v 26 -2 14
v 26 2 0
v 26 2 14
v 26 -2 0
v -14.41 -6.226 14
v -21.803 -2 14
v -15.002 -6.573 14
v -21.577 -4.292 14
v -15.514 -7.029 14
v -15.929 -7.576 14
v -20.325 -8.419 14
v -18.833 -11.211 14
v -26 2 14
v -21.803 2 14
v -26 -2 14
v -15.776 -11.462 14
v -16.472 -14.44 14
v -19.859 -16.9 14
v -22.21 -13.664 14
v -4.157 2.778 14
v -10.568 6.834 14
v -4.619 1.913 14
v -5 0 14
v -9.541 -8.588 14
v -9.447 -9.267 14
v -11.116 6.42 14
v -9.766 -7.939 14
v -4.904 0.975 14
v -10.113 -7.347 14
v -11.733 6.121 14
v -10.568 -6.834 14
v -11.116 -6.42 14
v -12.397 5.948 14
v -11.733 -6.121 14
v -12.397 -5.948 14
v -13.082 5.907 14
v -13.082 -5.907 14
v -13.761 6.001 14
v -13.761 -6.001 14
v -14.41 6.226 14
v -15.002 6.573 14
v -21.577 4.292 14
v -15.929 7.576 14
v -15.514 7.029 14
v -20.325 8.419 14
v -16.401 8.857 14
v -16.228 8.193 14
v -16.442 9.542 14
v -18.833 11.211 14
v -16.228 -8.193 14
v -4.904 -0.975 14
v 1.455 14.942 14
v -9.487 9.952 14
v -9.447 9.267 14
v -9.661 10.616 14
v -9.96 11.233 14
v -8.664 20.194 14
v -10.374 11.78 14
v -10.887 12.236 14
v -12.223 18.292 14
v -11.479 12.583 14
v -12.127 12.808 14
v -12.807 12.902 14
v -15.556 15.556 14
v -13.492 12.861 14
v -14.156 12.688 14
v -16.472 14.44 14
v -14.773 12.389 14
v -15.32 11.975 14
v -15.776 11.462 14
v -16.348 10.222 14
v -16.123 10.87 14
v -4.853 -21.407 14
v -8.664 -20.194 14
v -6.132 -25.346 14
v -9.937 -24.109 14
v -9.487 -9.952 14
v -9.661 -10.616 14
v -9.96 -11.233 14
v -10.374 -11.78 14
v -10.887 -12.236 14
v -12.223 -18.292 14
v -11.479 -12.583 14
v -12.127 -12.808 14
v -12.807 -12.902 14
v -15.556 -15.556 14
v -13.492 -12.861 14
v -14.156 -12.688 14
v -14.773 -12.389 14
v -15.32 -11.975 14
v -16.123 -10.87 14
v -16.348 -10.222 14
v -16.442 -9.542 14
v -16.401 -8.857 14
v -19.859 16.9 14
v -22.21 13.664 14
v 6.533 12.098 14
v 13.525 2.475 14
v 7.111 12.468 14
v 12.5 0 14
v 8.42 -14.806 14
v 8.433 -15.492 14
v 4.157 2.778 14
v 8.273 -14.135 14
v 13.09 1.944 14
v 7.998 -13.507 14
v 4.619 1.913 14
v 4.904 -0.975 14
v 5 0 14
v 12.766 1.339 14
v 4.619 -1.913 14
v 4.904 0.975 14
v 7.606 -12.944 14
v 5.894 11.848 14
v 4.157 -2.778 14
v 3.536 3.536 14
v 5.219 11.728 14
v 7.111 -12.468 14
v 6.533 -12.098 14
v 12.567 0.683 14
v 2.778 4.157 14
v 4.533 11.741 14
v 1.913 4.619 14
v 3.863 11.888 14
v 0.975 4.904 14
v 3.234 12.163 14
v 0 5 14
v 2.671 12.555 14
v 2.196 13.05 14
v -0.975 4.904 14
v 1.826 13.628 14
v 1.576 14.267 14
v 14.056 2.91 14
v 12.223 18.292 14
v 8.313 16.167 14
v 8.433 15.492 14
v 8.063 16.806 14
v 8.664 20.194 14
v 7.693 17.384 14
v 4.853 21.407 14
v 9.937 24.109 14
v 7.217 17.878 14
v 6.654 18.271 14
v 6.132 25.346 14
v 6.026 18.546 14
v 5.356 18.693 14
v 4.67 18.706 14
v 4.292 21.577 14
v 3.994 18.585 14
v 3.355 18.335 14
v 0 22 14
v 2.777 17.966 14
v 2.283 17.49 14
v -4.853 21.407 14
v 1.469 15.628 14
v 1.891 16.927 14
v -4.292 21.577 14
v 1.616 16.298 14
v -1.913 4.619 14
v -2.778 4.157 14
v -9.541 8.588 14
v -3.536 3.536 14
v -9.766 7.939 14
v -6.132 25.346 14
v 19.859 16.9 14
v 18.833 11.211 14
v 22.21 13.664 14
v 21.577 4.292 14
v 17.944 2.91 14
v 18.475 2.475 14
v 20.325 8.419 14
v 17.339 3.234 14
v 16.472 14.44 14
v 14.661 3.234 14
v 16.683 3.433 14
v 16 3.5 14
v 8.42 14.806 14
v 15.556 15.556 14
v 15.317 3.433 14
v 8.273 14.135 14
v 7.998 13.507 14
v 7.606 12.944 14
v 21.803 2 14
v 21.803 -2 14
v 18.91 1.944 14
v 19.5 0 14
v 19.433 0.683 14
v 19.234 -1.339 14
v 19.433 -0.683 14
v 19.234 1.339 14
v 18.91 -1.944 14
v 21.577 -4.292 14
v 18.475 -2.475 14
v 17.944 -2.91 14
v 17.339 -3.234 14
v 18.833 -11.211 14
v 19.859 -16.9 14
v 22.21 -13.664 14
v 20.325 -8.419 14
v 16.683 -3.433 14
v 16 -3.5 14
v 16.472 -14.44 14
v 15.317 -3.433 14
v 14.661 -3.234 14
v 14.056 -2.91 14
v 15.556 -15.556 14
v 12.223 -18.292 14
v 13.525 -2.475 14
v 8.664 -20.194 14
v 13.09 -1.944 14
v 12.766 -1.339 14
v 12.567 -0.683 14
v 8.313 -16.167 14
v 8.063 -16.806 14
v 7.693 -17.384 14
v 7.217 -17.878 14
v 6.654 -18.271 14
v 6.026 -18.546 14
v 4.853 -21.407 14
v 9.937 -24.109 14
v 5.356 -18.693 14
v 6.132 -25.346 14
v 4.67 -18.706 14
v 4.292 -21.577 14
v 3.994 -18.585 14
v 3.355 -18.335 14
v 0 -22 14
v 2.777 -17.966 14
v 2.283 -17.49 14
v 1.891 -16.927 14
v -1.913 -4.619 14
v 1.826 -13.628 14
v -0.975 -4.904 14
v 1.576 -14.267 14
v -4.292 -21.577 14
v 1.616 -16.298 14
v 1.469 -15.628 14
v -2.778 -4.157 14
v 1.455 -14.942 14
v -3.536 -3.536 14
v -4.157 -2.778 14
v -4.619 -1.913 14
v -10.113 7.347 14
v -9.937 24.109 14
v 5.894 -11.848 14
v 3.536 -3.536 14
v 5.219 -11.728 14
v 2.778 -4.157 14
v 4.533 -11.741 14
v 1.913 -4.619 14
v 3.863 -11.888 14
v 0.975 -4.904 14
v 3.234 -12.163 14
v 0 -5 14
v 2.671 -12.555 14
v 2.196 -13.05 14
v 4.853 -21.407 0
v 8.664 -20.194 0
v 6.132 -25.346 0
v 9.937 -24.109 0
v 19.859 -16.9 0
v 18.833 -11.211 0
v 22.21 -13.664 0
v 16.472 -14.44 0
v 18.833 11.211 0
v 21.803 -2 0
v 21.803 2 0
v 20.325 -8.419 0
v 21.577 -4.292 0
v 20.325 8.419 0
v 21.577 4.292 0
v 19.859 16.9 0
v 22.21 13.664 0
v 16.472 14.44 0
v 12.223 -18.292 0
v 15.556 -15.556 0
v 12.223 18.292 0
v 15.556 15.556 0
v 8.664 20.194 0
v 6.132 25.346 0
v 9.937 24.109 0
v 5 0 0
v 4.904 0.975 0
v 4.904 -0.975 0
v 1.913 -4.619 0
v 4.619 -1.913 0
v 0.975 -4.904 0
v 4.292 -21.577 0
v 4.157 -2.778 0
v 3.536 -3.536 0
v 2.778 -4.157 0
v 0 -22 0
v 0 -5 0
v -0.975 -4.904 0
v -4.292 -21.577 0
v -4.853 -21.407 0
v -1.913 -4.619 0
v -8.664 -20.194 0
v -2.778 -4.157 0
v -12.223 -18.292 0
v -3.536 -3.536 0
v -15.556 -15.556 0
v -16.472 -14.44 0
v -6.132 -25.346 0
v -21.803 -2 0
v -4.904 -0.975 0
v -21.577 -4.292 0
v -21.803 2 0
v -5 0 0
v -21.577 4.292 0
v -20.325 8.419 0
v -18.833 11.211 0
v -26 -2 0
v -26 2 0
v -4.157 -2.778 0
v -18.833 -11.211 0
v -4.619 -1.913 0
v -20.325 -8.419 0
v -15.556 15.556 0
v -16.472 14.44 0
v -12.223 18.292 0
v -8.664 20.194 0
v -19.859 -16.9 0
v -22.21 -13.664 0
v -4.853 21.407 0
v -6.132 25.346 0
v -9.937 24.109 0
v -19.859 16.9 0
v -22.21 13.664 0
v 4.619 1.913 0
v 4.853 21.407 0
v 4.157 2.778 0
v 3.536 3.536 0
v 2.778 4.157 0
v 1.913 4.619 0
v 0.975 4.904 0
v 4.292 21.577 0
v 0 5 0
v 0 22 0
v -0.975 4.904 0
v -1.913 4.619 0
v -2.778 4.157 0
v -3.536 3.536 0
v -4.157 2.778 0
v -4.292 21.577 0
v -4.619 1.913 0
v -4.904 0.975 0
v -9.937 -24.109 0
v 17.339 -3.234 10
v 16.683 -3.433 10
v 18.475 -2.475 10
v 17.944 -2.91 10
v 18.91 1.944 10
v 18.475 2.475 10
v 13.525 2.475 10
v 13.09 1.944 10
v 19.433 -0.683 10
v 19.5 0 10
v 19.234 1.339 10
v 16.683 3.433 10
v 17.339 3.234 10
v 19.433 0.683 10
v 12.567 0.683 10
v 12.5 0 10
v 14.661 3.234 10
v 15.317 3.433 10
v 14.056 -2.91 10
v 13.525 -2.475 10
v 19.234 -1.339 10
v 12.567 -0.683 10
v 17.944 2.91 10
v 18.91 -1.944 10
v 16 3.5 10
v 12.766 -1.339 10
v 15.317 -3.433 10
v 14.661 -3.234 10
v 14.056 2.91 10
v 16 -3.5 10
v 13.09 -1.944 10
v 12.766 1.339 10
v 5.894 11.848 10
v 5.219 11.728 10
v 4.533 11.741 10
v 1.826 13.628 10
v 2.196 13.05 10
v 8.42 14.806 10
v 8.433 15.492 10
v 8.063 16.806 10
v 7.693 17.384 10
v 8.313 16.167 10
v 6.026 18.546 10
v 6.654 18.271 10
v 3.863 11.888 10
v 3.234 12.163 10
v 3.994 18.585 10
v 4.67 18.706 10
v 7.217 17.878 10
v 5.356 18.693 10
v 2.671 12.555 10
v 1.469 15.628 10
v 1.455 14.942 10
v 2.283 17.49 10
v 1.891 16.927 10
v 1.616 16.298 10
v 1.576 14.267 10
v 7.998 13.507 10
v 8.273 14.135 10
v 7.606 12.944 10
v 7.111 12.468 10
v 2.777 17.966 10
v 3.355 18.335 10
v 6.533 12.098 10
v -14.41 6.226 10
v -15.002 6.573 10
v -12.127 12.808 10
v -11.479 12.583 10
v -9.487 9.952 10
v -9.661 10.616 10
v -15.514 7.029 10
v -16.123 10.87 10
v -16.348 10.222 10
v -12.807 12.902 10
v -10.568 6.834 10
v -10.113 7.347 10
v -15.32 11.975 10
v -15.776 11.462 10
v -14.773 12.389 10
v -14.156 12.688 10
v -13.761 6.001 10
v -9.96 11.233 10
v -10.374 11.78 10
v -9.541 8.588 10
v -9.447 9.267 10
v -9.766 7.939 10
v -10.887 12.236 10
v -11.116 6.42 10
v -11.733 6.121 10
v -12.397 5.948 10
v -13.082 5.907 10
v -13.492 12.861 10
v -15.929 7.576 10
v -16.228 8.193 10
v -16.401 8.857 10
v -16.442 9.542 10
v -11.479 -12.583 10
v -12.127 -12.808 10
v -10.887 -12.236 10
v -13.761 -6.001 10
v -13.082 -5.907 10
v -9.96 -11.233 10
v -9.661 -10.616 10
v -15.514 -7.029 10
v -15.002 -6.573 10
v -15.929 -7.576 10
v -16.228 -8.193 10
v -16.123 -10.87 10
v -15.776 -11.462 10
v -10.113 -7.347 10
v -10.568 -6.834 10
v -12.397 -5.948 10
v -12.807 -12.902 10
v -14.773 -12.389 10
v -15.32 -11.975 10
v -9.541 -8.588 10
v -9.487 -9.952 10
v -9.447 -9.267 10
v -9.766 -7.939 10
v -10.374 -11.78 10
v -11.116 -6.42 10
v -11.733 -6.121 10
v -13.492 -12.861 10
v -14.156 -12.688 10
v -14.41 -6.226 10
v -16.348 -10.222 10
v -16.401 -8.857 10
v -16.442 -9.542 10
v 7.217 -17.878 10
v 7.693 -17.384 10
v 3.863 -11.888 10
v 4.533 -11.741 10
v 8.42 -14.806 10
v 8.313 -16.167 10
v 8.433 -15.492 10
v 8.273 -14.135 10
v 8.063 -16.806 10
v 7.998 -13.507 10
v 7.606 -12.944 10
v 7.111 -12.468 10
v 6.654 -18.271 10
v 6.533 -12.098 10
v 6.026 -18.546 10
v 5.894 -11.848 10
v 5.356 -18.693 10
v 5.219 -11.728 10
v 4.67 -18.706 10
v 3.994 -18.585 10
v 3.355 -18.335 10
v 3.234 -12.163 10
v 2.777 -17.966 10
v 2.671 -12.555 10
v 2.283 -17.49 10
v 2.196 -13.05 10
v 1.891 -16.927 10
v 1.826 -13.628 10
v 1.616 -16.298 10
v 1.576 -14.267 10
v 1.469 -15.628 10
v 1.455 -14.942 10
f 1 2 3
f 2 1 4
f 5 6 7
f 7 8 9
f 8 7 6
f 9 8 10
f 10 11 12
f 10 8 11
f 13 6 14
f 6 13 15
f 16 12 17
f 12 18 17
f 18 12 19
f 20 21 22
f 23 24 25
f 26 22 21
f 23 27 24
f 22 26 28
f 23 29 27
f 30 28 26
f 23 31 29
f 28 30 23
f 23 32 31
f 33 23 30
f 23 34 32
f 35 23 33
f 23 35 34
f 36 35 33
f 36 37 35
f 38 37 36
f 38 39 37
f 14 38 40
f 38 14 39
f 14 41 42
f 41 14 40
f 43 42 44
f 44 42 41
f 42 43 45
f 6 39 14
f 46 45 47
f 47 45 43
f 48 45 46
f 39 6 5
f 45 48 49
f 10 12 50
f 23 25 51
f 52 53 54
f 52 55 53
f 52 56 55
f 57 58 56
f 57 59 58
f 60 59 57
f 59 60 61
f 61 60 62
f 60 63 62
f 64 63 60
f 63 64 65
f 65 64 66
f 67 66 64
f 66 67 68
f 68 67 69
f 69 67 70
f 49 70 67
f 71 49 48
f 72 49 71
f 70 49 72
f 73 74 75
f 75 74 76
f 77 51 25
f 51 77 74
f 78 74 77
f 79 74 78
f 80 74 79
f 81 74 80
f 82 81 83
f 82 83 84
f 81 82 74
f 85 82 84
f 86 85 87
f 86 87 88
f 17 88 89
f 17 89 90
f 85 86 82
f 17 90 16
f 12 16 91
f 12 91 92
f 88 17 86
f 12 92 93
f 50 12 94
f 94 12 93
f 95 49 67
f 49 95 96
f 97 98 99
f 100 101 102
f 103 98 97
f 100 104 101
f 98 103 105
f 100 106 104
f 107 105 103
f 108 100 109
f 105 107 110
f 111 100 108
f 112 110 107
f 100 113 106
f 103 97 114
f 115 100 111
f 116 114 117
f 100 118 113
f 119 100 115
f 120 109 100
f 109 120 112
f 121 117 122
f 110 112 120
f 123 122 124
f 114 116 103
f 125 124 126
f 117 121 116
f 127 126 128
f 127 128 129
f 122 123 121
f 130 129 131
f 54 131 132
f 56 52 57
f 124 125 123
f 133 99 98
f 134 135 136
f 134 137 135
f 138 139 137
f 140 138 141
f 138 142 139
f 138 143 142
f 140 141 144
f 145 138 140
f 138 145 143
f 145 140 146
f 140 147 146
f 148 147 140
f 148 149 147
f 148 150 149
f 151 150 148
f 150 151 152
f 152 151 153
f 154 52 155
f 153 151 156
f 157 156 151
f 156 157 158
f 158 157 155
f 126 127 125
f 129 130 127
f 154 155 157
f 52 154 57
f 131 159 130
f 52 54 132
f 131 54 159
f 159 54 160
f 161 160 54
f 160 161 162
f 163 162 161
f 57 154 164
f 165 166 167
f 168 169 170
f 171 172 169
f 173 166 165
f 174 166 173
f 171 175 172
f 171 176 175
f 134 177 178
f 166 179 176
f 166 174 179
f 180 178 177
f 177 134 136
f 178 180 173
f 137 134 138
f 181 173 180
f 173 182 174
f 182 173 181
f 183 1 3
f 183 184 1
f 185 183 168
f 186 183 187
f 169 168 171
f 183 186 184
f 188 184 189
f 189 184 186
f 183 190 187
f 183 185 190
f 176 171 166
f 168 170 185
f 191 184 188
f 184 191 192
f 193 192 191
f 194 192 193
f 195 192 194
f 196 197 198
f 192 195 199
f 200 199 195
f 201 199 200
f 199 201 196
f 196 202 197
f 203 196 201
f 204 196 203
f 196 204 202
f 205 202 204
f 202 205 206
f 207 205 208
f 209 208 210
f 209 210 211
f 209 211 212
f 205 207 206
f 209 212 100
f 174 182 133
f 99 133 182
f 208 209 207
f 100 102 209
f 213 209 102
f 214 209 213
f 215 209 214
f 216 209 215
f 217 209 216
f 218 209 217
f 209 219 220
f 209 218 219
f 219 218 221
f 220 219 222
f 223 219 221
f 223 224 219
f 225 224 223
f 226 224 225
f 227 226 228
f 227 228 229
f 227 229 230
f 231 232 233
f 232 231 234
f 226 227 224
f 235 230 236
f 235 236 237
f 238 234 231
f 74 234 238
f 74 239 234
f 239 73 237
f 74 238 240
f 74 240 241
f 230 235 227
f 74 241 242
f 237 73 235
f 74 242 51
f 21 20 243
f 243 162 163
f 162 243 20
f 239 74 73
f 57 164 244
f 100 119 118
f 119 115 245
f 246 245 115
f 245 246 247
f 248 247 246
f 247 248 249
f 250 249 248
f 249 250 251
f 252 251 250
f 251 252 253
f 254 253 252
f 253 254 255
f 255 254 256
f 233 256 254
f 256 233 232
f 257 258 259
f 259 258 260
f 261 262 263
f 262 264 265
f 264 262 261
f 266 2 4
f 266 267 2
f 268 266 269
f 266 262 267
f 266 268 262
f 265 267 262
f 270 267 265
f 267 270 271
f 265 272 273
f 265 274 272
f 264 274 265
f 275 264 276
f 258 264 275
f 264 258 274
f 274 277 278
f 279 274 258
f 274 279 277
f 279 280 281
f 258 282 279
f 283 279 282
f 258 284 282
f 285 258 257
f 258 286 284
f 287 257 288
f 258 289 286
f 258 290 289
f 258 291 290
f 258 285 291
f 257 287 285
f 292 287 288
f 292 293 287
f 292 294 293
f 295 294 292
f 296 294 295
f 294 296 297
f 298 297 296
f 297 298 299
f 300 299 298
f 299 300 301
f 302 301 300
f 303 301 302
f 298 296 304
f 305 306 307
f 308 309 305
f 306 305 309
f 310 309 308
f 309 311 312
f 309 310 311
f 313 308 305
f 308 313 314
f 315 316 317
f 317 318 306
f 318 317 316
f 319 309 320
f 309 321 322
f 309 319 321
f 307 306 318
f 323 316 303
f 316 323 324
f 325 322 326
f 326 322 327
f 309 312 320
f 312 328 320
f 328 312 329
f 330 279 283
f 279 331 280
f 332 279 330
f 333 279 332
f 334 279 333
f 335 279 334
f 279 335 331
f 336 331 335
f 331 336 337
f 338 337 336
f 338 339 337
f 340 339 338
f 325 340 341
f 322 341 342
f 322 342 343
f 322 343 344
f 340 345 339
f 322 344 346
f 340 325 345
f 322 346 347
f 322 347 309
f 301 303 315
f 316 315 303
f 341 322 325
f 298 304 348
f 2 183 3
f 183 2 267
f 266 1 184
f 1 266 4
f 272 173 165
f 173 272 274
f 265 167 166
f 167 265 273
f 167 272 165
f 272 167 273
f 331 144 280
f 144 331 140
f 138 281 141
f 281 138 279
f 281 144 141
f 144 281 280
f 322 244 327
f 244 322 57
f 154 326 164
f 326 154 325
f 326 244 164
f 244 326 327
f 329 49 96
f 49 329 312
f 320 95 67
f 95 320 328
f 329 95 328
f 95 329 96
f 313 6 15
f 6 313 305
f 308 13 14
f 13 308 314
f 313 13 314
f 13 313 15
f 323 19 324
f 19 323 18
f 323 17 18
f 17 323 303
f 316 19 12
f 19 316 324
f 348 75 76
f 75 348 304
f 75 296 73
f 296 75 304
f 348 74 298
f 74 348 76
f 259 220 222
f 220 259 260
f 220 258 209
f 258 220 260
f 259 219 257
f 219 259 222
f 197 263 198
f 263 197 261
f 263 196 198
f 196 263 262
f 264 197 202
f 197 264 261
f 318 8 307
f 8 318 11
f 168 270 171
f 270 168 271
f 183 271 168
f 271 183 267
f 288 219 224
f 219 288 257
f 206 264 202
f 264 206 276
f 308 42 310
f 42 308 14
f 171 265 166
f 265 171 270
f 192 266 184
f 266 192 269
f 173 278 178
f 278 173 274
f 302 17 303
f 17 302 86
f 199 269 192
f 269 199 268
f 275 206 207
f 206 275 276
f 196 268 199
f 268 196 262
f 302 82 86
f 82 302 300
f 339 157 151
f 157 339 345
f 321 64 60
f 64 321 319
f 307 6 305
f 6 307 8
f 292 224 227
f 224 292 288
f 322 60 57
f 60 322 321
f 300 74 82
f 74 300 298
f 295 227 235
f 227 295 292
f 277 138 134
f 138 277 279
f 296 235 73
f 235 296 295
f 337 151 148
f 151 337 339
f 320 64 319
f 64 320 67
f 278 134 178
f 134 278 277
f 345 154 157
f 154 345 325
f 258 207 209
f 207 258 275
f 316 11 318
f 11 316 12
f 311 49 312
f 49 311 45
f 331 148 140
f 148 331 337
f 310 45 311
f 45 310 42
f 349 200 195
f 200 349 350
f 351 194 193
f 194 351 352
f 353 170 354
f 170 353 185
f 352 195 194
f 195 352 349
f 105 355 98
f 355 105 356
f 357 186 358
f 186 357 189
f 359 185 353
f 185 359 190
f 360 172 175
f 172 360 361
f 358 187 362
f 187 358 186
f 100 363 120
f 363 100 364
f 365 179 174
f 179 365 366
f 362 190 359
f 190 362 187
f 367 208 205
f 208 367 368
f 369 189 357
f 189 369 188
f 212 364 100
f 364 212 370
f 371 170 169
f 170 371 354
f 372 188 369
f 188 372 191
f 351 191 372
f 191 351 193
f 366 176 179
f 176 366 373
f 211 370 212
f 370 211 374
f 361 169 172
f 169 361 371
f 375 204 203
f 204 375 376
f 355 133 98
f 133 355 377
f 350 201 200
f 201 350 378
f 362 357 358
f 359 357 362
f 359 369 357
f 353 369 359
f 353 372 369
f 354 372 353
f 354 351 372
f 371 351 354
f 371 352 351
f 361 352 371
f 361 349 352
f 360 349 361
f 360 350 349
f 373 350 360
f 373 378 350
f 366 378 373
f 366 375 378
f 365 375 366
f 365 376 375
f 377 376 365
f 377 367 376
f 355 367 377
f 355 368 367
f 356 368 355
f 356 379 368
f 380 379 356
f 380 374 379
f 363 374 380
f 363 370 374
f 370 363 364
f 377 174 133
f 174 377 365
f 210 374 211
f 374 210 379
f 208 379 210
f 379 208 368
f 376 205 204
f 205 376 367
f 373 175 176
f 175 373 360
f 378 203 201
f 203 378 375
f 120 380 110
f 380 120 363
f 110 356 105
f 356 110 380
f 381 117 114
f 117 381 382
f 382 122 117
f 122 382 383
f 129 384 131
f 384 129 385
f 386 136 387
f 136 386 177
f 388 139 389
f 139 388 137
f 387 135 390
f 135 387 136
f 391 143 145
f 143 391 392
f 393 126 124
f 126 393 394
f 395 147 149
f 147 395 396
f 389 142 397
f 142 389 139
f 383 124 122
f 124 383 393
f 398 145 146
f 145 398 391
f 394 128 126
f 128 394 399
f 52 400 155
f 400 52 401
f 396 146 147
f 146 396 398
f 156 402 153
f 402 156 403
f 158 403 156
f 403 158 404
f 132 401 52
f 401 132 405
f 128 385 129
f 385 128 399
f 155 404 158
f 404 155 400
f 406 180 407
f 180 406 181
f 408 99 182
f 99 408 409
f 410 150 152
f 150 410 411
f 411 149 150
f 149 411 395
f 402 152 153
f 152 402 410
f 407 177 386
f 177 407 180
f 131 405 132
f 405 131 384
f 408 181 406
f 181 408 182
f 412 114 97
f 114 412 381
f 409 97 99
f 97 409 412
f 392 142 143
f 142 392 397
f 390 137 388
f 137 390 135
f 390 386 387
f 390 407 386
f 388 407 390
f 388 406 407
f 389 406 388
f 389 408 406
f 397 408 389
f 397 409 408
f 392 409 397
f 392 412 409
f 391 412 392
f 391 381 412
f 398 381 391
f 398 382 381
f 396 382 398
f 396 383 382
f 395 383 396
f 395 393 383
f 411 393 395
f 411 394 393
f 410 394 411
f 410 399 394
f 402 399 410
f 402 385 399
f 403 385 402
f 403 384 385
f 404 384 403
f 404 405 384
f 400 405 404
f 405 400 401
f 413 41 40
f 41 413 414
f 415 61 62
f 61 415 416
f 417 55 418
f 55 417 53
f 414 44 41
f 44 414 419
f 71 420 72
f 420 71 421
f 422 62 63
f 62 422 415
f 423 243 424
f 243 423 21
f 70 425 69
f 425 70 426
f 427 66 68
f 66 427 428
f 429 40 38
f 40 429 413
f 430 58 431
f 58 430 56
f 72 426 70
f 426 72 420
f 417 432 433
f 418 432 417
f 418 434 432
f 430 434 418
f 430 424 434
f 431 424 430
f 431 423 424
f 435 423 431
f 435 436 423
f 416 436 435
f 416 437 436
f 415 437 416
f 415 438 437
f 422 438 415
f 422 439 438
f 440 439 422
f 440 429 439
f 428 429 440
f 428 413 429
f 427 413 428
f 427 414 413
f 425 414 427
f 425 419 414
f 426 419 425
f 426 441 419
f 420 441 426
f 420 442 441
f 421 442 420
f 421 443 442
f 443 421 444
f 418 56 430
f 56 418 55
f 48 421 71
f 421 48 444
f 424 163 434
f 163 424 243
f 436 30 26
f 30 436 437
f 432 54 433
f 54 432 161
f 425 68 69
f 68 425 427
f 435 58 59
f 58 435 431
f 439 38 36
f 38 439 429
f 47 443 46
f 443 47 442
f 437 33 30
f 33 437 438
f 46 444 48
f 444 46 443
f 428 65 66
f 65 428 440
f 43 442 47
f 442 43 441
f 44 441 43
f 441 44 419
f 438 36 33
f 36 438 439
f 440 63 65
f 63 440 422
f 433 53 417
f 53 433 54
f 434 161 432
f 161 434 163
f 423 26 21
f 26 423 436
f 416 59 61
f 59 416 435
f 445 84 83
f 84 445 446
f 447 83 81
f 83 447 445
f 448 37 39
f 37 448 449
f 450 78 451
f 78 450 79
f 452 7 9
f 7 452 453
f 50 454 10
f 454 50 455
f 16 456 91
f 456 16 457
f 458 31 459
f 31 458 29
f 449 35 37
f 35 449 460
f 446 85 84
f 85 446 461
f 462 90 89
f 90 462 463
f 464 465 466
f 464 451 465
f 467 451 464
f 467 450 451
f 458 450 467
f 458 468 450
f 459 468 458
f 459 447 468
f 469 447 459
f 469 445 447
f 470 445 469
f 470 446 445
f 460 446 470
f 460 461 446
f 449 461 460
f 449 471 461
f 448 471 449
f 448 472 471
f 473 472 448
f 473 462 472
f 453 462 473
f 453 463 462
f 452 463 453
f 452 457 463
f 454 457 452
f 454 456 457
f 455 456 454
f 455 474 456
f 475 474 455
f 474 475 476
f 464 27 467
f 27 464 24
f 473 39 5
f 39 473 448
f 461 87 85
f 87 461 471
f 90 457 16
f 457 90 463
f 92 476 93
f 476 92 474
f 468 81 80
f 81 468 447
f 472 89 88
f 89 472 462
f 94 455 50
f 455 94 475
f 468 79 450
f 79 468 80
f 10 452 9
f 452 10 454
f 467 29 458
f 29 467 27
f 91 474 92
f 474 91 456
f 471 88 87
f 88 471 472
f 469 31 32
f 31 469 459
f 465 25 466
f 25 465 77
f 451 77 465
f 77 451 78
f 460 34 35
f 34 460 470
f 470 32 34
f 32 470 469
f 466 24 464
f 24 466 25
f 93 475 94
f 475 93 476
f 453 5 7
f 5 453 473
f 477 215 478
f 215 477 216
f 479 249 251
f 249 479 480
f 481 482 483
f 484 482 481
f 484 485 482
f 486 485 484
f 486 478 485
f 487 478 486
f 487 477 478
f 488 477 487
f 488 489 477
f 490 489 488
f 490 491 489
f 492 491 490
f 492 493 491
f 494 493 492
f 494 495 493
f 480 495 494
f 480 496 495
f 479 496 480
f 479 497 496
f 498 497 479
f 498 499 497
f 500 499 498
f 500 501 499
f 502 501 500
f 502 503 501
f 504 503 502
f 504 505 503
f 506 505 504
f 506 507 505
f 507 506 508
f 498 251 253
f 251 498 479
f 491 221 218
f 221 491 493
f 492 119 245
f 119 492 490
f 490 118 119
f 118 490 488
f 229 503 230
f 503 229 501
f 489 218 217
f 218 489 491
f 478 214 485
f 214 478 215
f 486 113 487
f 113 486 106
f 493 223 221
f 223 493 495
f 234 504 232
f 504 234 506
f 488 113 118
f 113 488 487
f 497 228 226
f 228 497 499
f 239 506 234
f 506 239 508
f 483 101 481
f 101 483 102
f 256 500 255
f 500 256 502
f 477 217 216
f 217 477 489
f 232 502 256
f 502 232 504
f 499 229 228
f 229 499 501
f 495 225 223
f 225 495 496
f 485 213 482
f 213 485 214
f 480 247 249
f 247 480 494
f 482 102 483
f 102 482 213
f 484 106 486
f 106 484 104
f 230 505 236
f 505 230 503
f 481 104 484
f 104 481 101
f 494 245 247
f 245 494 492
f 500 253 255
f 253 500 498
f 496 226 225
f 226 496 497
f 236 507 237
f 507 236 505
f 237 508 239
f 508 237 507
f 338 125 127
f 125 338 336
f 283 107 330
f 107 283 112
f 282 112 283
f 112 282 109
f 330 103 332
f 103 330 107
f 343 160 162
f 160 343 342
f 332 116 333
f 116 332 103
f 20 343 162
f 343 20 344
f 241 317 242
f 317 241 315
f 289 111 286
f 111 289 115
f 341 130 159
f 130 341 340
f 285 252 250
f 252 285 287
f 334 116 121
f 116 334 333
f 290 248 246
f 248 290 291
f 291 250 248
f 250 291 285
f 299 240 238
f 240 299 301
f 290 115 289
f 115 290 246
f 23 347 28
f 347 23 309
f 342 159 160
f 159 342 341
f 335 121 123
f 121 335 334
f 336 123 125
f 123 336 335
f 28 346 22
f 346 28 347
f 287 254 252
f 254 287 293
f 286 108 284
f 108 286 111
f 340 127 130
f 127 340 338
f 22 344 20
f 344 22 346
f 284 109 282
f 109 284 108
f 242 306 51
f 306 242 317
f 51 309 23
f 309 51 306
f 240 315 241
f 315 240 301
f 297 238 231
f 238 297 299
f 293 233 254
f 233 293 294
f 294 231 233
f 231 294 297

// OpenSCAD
$fn = 32;

// ----------------------------------------------------------------------
// Spur blank: lightened gear blank
// ----------------------------------------------------------------------

// --- parameters (mm) ---
disc_r = 22;              // blank root radius
disc_t = 14;              // blank thickness
n_teeth = 10;             // stub tooth count
tooth_w = 4;              // tooth width at the root
tooth_h = 4;              // tooth height above the root
bore_r = 5;               // central bore radius
ring_r = 16;              // lightening pocket ring radius
pocket_r = 3.5;           // lightening pocket radius

out_r = disc_r + tooth_h;  // tip radius
bbox_x = 52.0;  // measured width over the teeth
bbox_y = 50.69;  // measured depth over the teeth

difference() {
union() {
  cylinder(r = disc_r, h = disc_t);
  for (i = [0 : n_teeth - 1])
    rotate([0, 0, i * 360 / n_teeth])
      translate([disc_r - 1, -tooth_w / 2, 0])
        cube([tooth_h + 1, tooth_w, disc_t]);
}
  translate([0, 0, -1]) cylinder(r = bore_r, h = disc_t + 2);
  for (i = [0 : 5])
    rotate([0, 0, i * 72])
      translate([ring_r, 0, disc_t - 4])
        cylinder(r = pocket_r, h = 5);
}
